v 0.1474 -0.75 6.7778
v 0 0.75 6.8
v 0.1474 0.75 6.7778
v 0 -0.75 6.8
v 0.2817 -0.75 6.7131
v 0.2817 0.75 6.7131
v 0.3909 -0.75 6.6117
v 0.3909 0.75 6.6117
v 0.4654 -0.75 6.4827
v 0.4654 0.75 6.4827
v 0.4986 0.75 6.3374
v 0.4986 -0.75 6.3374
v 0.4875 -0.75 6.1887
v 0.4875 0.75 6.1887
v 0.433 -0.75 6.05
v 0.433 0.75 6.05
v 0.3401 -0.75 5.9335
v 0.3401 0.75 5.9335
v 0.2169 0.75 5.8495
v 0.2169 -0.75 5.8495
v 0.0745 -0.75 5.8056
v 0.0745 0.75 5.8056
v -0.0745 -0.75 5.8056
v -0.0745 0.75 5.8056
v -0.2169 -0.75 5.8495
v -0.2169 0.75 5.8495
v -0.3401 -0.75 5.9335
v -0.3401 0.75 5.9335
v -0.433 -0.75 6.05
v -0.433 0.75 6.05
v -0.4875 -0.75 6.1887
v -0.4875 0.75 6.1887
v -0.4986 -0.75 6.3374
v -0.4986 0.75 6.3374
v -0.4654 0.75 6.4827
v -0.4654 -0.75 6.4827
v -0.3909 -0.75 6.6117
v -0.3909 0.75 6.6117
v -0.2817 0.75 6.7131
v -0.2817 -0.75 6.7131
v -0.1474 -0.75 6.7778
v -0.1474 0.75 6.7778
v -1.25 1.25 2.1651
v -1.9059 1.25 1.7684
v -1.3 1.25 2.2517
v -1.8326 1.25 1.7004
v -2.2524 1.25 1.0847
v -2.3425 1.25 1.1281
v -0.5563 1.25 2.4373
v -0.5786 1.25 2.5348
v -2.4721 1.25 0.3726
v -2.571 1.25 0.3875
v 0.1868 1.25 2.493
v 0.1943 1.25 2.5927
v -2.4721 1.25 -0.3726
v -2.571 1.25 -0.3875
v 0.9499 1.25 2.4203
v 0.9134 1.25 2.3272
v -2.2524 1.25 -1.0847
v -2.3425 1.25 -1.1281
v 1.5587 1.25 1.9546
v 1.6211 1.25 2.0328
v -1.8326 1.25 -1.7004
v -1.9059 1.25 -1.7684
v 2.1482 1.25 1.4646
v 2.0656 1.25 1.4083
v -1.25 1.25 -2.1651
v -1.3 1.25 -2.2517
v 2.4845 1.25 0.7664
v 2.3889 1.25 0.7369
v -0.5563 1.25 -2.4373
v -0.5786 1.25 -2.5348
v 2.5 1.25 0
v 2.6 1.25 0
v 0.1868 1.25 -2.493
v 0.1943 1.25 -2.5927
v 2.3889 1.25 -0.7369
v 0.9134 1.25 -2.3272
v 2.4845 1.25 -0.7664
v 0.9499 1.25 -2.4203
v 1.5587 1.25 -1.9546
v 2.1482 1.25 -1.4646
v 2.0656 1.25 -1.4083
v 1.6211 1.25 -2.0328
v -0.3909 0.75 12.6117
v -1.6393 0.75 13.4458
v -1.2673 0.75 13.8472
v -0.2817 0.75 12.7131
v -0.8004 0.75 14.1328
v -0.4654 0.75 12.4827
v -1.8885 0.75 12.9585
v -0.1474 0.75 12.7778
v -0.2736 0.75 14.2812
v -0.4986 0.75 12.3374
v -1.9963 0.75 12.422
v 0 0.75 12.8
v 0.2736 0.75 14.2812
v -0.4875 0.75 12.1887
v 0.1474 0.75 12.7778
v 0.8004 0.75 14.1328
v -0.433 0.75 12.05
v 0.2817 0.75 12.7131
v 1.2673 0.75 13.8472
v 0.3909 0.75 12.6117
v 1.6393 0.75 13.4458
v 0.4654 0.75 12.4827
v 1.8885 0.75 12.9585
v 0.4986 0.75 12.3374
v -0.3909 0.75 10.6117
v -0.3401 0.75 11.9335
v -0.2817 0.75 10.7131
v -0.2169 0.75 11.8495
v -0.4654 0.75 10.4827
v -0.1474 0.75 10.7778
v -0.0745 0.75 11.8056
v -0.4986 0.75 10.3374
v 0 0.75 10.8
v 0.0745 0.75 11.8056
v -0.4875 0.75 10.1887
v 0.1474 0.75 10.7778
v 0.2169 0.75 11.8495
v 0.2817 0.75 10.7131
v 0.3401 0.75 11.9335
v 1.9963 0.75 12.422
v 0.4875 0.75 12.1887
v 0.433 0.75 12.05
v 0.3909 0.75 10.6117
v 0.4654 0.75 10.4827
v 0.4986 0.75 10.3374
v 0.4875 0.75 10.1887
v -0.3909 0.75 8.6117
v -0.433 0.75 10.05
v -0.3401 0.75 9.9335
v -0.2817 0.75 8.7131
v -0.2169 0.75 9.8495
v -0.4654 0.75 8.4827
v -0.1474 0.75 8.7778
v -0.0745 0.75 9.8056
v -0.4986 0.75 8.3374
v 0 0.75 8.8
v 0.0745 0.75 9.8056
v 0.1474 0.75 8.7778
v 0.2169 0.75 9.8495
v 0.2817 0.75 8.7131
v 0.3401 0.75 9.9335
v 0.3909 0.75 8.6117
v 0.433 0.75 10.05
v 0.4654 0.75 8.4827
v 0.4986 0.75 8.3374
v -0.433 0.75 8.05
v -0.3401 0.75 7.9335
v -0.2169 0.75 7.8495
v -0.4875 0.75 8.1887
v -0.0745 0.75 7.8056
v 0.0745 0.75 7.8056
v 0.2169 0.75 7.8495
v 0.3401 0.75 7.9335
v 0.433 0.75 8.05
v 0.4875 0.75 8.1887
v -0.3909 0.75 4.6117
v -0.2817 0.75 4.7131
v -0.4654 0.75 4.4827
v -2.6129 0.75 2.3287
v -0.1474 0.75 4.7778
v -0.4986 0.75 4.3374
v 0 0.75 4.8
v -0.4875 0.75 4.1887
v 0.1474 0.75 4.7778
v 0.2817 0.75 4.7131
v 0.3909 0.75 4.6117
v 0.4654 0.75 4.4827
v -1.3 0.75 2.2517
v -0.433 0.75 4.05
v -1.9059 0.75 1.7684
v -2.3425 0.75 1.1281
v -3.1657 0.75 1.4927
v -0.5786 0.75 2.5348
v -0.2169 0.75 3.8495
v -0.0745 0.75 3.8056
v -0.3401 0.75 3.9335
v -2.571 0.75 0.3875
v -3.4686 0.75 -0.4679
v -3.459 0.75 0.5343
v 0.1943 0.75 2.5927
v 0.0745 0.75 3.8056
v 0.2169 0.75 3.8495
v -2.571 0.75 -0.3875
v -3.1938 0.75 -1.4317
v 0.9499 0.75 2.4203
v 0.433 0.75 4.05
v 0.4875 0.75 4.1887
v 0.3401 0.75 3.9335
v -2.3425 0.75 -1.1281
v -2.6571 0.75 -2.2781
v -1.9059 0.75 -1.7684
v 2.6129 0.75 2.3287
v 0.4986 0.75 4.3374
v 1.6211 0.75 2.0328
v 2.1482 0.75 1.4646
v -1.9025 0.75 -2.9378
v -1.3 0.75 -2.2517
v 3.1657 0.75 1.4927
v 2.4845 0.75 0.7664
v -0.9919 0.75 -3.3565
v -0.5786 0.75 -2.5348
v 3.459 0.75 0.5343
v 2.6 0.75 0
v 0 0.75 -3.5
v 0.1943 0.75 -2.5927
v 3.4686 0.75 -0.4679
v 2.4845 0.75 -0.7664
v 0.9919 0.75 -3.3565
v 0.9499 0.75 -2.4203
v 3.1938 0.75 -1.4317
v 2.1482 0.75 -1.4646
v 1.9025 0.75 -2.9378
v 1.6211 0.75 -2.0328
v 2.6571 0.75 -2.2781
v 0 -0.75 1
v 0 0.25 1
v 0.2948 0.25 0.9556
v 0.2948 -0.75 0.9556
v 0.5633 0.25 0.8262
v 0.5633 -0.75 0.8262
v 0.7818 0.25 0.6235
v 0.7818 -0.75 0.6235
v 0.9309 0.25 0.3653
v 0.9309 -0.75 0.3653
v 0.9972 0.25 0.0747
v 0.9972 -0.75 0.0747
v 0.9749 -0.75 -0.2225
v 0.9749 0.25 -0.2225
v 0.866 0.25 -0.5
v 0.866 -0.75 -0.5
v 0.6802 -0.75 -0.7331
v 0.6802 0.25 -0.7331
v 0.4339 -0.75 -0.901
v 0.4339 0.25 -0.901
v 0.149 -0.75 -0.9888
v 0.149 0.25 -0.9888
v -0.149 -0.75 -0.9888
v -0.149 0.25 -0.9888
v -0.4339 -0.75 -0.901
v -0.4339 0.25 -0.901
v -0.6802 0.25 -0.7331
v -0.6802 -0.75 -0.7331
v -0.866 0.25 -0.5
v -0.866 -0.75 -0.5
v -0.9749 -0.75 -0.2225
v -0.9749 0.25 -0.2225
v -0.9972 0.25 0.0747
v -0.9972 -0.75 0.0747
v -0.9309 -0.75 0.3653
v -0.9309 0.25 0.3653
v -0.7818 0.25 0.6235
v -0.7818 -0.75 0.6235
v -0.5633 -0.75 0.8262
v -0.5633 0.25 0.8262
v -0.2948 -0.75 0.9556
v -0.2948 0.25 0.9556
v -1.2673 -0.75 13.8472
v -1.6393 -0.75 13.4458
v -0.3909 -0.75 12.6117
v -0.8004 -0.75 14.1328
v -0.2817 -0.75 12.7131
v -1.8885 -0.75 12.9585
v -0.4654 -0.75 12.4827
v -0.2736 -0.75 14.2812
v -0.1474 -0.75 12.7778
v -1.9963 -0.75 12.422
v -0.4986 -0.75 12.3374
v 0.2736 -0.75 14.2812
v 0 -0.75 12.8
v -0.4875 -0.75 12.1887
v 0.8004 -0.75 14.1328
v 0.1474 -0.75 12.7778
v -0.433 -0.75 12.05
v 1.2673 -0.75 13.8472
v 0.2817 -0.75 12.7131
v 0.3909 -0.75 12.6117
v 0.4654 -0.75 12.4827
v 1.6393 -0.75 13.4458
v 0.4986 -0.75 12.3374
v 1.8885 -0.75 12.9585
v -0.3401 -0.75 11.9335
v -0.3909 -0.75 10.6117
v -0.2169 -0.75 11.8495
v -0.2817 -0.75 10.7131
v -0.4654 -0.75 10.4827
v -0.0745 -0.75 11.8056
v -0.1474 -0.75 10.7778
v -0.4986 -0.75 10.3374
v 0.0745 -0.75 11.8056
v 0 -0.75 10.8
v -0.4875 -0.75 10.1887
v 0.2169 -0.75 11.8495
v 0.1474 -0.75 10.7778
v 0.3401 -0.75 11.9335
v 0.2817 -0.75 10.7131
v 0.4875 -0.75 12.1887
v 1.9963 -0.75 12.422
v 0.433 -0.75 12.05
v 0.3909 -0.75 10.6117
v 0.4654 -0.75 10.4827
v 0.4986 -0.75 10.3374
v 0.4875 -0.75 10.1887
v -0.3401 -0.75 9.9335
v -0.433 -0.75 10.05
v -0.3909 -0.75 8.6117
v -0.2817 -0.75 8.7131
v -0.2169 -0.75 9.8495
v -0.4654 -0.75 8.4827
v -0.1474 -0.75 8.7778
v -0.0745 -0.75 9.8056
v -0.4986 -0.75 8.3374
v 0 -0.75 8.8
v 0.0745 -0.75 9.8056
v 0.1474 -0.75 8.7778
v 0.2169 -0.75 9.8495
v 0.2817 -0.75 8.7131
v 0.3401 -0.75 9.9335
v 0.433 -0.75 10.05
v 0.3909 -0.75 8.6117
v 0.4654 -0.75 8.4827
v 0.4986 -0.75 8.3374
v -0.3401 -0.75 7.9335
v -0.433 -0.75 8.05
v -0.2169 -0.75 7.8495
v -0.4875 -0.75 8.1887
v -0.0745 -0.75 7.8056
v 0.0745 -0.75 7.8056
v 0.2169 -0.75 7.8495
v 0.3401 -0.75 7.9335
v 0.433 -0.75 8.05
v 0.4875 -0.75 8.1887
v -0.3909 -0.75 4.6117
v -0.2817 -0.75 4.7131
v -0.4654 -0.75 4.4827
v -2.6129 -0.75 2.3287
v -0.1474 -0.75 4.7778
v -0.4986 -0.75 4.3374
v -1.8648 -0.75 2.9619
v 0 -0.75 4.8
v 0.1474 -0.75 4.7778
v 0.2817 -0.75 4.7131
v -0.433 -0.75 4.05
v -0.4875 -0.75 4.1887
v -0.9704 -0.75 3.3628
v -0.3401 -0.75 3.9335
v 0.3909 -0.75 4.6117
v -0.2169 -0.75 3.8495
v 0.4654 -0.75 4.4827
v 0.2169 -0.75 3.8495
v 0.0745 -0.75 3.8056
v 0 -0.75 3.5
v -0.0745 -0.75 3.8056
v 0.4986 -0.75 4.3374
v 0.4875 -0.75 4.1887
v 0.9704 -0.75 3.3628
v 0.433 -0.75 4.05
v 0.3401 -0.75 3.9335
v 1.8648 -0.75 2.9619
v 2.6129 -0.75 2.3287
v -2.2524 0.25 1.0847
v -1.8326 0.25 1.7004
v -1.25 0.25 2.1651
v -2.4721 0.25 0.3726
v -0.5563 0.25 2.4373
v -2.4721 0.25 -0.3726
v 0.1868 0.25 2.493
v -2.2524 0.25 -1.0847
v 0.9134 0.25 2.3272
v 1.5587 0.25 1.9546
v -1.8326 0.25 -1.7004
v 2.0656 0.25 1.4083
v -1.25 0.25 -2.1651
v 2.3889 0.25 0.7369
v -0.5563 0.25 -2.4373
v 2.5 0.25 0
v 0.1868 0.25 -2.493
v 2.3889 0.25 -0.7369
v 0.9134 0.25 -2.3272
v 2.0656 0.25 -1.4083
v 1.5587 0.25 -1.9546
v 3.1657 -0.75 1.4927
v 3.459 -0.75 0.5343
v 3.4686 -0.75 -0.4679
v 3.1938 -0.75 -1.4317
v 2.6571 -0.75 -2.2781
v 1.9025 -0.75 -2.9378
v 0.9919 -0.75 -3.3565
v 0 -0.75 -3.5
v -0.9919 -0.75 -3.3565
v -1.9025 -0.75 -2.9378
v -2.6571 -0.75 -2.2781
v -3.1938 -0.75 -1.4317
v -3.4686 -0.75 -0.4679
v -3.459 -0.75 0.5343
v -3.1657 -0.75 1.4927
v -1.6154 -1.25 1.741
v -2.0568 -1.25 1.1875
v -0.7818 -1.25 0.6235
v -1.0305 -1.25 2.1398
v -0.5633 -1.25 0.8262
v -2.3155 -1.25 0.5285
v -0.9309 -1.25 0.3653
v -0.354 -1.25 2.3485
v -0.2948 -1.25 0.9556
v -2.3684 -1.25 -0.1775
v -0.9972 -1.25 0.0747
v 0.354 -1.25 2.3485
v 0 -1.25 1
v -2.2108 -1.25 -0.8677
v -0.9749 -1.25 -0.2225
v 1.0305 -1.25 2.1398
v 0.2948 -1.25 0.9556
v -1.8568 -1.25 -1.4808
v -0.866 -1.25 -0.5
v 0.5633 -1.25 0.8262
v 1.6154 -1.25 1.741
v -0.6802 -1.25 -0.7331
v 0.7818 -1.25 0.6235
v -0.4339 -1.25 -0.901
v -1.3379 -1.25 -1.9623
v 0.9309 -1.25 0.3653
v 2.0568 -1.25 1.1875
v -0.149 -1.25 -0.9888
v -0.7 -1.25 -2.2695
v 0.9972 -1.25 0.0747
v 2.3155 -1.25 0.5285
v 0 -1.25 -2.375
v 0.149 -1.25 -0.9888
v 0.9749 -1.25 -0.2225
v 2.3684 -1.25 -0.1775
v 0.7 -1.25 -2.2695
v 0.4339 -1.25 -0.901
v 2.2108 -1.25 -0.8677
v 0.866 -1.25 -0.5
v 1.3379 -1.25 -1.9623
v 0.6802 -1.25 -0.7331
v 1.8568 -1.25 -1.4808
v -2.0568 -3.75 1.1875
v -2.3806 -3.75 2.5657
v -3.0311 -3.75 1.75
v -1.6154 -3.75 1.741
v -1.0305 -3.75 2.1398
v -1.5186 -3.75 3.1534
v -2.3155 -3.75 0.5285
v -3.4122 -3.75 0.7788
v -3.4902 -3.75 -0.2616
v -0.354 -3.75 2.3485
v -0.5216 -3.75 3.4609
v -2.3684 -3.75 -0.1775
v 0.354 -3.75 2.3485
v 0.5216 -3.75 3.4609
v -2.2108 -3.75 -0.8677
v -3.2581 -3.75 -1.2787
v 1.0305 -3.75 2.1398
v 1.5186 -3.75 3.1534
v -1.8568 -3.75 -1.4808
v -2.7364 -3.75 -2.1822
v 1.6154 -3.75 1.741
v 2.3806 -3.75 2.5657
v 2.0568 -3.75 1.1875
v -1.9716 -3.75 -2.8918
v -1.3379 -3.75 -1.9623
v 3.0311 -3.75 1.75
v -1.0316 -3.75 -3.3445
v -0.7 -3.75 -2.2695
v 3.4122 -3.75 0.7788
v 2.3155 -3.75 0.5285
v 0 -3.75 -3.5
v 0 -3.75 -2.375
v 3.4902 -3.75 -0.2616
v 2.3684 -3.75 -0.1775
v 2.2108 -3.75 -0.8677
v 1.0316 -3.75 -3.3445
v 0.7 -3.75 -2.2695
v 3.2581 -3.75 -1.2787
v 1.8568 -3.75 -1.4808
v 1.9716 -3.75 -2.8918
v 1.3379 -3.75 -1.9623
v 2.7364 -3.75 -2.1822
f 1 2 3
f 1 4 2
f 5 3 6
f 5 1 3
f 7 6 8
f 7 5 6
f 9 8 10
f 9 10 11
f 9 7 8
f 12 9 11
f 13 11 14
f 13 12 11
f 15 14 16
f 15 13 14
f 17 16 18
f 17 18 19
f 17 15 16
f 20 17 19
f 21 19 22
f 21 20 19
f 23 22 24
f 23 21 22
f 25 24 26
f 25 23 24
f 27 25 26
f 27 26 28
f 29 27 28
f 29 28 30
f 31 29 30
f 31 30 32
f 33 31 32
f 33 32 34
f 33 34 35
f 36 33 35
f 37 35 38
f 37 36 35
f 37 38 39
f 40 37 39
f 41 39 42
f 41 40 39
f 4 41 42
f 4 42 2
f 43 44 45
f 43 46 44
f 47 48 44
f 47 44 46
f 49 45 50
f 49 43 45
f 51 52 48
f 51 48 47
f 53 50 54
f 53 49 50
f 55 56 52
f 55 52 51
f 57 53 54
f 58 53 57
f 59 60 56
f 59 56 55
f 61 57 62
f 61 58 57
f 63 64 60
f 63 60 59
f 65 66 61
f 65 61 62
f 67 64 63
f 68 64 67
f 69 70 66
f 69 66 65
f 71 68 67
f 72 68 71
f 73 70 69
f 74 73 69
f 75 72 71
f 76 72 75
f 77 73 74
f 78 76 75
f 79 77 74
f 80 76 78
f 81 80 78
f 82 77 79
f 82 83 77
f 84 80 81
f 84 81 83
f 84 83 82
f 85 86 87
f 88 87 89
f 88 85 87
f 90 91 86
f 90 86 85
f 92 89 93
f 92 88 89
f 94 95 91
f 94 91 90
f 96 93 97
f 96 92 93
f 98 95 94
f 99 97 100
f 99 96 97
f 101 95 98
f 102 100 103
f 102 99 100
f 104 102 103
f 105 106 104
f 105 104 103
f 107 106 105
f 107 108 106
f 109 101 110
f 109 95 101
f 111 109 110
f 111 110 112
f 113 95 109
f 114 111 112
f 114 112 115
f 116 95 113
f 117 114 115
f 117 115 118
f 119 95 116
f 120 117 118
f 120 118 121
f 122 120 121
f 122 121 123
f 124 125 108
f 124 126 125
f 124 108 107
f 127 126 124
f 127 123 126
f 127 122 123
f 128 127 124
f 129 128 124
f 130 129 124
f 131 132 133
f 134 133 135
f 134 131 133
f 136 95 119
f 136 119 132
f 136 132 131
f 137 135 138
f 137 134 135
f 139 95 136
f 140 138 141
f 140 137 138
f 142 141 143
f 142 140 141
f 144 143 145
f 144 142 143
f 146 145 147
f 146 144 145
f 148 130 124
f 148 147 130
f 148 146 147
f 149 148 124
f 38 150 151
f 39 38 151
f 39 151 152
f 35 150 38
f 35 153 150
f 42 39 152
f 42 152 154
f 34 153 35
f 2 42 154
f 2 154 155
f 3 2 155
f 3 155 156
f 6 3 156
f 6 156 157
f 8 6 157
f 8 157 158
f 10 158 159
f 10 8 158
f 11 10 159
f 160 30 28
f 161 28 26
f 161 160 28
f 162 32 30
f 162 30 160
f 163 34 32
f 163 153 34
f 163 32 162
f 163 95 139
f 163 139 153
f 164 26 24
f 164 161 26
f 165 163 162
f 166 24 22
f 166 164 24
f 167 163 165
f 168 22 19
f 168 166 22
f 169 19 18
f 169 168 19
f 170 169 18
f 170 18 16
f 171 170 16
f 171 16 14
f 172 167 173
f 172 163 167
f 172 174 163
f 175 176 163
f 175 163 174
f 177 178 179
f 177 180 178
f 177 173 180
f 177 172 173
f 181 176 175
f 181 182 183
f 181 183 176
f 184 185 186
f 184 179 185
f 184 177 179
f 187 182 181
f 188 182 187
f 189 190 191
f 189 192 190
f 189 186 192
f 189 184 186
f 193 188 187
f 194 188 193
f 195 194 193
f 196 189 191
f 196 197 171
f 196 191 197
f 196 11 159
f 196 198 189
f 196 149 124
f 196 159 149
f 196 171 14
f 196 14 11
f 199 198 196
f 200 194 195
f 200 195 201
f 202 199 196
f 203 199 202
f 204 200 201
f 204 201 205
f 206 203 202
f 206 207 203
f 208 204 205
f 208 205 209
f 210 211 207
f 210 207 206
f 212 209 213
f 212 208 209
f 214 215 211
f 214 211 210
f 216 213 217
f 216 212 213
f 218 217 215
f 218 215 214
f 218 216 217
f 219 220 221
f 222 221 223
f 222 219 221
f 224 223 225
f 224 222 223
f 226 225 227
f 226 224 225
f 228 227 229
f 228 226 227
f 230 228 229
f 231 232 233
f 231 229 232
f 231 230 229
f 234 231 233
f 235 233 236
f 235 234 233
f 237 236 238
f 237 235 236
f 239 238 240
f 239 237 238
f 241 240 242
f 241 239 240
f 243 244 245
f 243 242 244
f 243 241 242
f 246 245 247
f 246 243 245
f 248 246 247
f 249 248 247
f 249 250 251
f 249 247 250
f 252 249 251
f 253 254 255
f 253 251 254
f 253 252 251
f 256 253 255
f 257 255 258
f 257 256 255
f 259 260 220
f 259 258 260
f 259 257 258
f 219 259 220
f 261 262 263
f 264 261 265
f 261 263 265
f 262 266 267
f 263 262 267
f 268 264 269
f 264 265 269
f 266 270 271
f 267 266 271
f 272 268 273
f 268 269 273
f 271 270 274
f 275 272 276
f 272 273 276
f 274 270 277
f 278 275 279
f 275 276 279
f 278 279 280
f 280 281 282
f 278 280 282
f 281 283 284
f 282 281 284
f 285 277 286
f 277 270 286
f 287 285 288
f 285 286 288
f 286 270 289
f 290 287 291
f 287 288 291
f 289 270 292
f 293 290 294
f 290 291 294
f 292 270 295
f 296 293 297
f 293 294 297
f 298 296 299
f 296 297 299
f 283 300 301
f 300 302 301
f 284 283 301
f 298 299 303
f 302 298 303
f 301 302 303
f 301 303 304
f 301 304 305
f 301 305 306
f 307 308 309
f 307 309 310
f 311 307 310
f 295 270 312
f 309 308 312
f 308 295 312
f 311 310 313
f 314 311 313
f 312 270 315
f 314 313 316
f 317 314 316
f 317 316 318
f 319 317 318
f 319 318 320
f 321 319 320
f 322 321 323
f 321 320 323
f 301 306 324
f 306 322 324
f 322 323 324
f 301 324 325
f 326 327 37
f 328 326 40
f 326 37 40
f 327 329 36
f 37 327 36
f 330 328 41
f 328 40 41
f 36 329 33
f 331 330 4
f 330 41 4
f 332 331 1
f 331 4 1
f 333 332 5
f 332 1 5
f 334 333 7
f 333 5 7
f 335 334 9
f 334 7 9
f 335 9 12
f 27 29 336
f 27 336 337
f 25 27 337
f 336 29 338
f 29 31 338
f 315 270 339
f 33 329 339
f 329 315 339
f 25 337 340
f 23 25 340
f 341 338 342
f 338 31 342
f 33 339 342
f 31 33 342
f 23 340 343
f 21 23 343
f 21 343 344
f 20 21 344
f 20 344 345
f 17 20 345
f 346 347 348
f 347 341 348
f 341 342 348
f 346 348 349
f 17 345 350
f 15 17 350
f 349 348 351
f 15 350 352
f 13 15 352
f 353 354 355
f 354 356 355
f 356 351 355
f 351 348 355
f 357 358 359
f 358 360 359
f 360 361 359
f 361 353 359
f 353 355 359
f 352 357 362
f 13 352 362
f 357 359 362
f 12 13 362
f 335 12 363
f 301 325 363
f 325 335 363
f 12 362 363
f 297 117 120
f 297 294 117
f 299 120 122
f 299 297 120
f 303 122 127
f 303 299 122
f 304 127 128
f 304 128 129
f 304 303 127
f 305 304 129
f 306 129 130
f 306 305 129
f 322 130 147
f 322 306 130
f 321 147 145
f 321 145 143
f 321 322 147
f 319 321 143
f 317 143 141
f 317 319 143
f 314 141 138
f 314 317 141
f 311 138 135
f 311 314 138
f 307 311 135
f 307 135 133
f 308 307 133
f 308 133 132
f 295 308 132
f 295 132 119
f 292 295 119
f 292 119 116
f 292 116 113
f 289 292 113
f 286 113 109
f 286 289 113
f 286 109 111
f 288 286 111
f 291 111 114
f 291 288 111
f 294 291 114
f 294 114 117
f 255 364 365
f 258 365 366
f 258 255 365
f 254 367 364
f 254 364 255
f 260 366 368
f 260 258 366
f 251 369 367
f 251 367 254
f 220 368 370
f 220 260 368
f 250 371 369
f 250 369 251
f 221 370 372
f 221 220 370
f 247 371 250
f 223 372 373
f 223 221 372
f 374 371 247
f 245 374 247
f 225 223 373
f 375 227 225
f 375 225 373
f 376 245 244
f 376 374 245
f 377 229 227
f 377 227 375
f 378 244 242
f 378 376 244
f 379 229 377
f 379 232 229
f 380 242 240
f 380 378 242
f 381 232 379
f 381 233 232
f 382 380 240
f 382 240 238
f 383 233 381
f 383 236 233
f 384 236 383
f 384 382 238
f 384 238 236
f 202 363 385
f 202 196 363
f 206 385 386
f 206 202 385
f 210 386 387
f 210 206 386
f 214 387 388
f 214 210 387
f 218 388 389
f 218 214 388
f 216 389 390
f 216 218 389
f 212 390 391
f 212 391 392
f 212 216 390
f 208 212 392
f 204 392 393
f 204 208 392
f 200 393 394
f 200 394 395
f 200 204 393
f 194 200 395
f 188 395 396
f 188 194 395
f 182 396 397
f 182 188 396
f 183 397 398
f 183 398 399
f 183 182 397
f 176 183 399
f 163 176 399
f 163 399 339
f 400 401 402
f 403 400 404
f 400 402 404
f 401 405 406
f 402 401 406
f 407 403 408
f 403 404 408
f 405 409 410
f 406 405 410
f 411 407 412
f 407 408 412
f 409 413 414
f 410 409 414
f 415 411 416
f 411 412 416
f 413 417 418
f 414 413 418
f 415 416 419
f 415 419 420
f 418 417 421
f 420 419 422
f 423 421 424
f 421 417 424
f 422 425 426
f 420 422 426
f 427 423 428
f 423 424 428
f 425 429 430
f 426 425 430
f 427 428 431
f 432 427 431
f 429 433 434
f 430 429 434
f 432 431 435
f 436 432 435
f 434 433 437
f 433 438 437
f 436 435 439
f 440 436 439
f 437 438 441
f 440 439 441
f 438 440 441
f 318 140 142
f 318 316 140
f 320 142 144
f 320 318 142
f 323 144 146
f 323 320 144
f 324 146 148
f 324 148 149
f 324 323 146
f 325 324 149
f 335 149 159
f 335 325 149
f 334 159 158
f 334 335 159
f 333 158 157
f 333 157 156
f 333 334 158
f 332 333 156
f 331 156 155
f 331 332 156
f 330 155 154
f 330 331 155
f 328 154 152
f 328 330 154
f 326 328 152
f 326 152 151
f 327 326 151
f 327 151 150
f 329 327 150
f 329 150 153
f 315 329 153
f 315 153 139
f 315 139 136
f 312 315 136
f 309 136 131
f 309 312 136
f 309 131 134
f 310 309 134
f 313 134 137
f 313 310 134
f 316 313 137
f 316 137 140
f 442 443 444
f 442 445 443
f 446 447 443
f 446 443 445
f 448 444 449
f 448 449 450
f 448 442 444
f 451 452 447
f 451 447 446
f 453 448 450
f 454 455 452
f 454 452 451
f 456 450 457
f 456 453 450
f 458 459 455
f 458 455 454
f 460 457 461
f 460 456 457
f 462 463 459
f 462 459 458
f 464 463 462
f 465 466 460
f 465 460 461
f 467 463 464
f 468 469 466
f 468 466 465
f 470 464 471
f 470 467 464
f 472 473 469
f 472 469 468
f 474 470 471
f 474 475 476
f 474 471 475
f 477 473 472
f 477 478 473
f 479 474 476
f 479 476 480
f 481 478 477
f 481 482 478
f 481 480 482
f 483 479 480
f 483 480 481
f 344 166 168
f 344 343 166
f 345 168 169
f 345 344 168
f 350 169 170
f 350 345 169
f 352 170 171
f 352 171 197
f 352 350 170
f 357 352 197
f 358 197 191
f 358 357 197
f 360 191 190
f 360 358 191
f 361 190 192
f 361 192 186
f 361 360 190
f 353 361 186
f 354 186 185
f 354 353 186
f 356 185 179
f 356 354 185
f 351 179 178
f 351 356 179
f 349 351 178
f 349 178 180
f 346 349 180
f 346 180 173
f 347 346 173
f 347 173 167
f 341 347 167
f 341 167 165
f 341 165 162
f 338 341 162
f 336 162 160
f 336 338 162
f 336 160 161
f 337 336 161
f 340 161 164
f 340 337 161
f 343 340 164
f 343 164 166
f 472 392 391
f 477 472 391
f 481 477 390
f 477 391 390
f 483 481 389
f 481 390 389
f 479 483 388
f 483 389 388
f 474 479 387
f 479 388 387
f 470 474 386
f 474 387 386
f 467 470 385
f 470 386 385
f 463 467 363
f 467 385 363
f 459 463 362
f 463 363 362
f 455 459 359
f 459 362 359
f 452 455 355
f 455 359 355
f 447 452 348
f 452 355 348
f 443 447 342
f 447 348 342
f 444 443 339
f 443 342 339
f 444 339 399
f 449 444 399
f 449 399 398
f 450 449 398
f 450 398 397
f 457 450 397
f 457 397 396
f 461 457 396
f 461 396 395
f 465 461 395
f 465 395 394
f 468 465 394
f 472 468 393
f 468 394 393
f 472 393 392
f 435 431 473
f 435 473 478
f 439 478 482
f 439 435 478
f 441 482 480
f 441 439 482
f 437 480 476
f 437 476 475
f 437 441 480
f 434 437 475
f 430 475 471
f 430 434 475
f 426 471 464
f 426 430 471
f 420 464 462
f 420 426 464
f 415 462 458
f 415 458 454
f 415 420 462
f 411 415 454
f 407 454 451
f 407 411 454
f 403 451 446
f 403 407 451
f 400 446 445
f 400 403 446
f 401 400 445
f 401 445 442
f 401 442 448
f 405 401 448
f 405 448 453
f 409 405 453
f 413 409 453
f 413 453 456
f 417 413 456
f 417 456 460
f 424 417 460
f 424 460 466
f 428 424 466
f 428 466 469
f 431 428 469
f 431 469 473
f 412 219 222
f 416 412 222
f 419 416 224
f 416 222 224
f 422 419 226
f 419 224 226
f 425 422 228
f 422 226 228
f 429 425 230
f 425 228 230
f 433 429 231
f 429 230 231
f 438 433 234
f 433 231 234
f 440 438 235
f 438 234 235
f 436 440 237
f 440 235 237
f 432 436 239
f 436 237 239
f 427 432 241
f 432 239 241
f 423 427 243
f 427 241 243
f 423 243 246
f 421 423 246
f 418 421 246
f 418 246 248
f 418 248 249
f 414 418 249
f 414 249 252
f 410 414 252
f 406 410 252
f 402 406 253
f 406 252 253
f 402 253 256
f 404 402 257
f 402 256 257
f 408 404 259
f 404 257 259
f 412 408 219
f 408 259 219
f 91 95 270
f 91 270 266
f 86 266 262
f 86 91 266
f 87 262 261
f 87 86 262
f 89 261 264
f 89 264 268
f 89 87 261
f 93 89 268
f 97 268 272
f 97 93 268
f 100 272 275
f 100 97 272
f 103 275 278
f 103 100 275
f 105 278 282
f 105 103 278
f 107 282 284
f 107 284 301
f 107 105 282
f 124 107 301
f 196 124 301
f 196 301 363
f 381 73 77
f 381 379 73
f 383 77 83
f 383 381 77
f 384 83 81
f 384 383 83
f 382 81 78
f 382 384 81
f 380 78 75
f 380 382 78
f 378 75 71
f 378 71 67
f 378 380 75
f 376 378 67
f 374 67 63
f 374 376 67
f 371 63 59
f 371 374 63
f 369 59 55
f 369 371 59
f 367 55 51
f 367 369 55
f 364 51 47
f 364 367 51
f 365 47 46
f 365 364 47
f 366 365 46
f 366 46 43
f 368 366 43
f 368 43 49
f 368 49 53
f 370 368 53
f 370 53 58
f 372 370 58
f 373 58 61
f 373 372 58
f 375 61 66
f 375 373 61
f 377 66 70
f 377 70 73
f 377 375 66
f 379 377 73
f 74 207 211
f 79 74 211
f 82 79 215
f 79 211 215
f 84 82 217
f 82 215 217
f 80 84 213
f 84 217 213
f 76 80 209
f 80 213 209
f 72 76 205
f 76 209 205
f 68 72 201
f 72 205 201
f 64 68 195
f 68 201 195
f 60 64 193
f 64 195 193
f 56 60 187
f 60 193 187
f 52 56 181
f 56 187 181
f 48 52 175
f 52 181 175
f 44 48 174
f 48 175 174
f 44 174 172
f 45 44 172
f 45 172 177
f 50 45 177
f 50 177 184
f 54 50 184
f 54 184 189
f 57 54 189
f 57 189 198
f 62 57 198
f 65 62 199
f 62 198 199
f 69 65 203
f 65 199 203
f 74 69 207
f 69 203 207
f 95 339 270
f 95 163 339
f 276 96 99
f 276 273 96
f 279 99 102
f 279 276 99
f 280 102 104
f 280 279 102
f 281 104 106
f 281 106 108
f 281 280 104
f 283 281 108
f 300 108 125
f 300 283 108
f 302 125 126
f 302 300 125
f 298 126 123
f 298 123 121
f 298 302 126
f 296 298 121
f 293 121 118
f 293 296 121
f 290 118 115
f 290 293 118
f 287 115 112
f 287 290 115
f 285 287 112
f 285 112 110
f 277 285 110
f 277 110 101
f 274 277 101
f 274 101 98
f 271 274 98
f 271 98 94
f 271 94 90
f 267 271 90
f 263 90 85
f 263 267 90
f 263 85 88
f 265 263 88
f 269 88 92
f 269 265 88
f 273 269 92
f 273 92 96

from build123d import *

# Parameters (mm, degrees)
SKETCH1_R           = 0.5
SKETCH1_R_2         = 1
BOSS_EXTRUDE1_DEPTH = 0.75
SKETCH2_R           = 3.5
SKETCH2_R_2         = 2.375
BOSS_EXTRUDE2_DEPTH = 3
SKETCH4_R           = 2.6
SKETCH4_R_2         = 2.5
EXTRUDE_THIN1_DEPTH = 0.5
CUT_EXTRUDE1_START  = -0.5
SKETCH5_R           = 2.5
CUT_EXTRUDE1_DEPTH  = 0.5
MOVE_FACE1_BY       = 0.5


with BuildPart() as part:
    # Sketch1 → Boss-Extrude1 (new, symmetric)
    with BuildSketch(Plane(origin=(0, 0, 0), x_dir=(1, 0, 0), z_dir=(0, 1, 0))):
        with BuildLine():
            Line((-2.612867, -2.328718), (-1.996279, -12.421951))
            ThreePointArc((-1.996279, -12.421951), (0, -14.3), (1.996279, -12.421951))
            Line((1.996279, -12.421951), (2.612867, -2.328718))
            ThreePointArc((2.612867, -2.328718), (0, 3.5), (-2.612867, -2.328718))
        make_face()
        with Locations(Location((0, -12.3, 0), (0, 0, 270))):
            Circle(SKETCH1_R, mode=Mode.SUBTRACT)
        with Locations(Location((0, -10.3, 0), (0, 0, 270))):
            Circle(SKETCH1_R, mode=Mode.SUBTRACT)
        with Locations(Location((0, -8.3, 0), (0, 0, 270))):
            Circle(SKETCH1_R, mode=Mode.SUBTRACT)
        with Locations(Location((0, -6.3, 0), (0, 0, 270))):
            Circle(SKETCH1_R, mode=Mode.SUBTRACT)
        with Locations(Location((0, -4.3, 0), (0, 0, 270))):
            Circle(SKETCH1_R, mode=Mode.SUBTRACT)
        with Locations(Location((0, 0, 0), (0, 0, 270))):
            Circle(SKETCH1_R_2, mode=Mode.SUBTRACT)
    extrude(amount=BOSS_EXTRUDE1_DEPTH, both=True)

    # Sketch2 → Boss-Extrude2 (add)
    with BuildSketch(Plane.XZ.offset(0.75)):
        with Locations(Location((0, 0, 0), (0, 0, 270))):
            Circle(SKETCH2_R)
        with Locations(Location((0, 0, 0), (0, 0, 270))):
            Circle(SKETCH2_R_2, mode=Mode.SUBTRACT)
    extrude(amount=BOSS_EXTRUDE2_DEPTH)

    # Sketch4 → Extrude-Thin1 (add)
    with BuildSketch(Plane(origin=(0, 0.75, 0), x_dir=(1, 0, 0), z_dir=(0, 1, 0))):
        Circle(SKETCH4_R)
        Circle(SKETCH4_R_2, mode=Mode.SUBTRACT)
    extrude(amount=EXTRUDE_THIN1_DEPTH)

    # Sketch5 → Cut-Extrude1 (cut)
    with BuildSketch(Plane(origin=(0, 0.75, 0), x_dir=(1, 0, 0), z_dir=(0, 1, 0)).offset(CUT_EXTRUDE1_START)):
        Circle(SKETCH5_R)
    extrude(amount=CUT_EXTRUDE1_DEPTH, mode=Mode.SUBTRACT)

    # Move Face1: a face moved outward by 0.5
    extrude(part.faces().sort_by_distance((0, -0.75, 1.1875))[0], amount=MOVE_FACE1_BY, dir=(0, -1, 0))


solid = part.part
